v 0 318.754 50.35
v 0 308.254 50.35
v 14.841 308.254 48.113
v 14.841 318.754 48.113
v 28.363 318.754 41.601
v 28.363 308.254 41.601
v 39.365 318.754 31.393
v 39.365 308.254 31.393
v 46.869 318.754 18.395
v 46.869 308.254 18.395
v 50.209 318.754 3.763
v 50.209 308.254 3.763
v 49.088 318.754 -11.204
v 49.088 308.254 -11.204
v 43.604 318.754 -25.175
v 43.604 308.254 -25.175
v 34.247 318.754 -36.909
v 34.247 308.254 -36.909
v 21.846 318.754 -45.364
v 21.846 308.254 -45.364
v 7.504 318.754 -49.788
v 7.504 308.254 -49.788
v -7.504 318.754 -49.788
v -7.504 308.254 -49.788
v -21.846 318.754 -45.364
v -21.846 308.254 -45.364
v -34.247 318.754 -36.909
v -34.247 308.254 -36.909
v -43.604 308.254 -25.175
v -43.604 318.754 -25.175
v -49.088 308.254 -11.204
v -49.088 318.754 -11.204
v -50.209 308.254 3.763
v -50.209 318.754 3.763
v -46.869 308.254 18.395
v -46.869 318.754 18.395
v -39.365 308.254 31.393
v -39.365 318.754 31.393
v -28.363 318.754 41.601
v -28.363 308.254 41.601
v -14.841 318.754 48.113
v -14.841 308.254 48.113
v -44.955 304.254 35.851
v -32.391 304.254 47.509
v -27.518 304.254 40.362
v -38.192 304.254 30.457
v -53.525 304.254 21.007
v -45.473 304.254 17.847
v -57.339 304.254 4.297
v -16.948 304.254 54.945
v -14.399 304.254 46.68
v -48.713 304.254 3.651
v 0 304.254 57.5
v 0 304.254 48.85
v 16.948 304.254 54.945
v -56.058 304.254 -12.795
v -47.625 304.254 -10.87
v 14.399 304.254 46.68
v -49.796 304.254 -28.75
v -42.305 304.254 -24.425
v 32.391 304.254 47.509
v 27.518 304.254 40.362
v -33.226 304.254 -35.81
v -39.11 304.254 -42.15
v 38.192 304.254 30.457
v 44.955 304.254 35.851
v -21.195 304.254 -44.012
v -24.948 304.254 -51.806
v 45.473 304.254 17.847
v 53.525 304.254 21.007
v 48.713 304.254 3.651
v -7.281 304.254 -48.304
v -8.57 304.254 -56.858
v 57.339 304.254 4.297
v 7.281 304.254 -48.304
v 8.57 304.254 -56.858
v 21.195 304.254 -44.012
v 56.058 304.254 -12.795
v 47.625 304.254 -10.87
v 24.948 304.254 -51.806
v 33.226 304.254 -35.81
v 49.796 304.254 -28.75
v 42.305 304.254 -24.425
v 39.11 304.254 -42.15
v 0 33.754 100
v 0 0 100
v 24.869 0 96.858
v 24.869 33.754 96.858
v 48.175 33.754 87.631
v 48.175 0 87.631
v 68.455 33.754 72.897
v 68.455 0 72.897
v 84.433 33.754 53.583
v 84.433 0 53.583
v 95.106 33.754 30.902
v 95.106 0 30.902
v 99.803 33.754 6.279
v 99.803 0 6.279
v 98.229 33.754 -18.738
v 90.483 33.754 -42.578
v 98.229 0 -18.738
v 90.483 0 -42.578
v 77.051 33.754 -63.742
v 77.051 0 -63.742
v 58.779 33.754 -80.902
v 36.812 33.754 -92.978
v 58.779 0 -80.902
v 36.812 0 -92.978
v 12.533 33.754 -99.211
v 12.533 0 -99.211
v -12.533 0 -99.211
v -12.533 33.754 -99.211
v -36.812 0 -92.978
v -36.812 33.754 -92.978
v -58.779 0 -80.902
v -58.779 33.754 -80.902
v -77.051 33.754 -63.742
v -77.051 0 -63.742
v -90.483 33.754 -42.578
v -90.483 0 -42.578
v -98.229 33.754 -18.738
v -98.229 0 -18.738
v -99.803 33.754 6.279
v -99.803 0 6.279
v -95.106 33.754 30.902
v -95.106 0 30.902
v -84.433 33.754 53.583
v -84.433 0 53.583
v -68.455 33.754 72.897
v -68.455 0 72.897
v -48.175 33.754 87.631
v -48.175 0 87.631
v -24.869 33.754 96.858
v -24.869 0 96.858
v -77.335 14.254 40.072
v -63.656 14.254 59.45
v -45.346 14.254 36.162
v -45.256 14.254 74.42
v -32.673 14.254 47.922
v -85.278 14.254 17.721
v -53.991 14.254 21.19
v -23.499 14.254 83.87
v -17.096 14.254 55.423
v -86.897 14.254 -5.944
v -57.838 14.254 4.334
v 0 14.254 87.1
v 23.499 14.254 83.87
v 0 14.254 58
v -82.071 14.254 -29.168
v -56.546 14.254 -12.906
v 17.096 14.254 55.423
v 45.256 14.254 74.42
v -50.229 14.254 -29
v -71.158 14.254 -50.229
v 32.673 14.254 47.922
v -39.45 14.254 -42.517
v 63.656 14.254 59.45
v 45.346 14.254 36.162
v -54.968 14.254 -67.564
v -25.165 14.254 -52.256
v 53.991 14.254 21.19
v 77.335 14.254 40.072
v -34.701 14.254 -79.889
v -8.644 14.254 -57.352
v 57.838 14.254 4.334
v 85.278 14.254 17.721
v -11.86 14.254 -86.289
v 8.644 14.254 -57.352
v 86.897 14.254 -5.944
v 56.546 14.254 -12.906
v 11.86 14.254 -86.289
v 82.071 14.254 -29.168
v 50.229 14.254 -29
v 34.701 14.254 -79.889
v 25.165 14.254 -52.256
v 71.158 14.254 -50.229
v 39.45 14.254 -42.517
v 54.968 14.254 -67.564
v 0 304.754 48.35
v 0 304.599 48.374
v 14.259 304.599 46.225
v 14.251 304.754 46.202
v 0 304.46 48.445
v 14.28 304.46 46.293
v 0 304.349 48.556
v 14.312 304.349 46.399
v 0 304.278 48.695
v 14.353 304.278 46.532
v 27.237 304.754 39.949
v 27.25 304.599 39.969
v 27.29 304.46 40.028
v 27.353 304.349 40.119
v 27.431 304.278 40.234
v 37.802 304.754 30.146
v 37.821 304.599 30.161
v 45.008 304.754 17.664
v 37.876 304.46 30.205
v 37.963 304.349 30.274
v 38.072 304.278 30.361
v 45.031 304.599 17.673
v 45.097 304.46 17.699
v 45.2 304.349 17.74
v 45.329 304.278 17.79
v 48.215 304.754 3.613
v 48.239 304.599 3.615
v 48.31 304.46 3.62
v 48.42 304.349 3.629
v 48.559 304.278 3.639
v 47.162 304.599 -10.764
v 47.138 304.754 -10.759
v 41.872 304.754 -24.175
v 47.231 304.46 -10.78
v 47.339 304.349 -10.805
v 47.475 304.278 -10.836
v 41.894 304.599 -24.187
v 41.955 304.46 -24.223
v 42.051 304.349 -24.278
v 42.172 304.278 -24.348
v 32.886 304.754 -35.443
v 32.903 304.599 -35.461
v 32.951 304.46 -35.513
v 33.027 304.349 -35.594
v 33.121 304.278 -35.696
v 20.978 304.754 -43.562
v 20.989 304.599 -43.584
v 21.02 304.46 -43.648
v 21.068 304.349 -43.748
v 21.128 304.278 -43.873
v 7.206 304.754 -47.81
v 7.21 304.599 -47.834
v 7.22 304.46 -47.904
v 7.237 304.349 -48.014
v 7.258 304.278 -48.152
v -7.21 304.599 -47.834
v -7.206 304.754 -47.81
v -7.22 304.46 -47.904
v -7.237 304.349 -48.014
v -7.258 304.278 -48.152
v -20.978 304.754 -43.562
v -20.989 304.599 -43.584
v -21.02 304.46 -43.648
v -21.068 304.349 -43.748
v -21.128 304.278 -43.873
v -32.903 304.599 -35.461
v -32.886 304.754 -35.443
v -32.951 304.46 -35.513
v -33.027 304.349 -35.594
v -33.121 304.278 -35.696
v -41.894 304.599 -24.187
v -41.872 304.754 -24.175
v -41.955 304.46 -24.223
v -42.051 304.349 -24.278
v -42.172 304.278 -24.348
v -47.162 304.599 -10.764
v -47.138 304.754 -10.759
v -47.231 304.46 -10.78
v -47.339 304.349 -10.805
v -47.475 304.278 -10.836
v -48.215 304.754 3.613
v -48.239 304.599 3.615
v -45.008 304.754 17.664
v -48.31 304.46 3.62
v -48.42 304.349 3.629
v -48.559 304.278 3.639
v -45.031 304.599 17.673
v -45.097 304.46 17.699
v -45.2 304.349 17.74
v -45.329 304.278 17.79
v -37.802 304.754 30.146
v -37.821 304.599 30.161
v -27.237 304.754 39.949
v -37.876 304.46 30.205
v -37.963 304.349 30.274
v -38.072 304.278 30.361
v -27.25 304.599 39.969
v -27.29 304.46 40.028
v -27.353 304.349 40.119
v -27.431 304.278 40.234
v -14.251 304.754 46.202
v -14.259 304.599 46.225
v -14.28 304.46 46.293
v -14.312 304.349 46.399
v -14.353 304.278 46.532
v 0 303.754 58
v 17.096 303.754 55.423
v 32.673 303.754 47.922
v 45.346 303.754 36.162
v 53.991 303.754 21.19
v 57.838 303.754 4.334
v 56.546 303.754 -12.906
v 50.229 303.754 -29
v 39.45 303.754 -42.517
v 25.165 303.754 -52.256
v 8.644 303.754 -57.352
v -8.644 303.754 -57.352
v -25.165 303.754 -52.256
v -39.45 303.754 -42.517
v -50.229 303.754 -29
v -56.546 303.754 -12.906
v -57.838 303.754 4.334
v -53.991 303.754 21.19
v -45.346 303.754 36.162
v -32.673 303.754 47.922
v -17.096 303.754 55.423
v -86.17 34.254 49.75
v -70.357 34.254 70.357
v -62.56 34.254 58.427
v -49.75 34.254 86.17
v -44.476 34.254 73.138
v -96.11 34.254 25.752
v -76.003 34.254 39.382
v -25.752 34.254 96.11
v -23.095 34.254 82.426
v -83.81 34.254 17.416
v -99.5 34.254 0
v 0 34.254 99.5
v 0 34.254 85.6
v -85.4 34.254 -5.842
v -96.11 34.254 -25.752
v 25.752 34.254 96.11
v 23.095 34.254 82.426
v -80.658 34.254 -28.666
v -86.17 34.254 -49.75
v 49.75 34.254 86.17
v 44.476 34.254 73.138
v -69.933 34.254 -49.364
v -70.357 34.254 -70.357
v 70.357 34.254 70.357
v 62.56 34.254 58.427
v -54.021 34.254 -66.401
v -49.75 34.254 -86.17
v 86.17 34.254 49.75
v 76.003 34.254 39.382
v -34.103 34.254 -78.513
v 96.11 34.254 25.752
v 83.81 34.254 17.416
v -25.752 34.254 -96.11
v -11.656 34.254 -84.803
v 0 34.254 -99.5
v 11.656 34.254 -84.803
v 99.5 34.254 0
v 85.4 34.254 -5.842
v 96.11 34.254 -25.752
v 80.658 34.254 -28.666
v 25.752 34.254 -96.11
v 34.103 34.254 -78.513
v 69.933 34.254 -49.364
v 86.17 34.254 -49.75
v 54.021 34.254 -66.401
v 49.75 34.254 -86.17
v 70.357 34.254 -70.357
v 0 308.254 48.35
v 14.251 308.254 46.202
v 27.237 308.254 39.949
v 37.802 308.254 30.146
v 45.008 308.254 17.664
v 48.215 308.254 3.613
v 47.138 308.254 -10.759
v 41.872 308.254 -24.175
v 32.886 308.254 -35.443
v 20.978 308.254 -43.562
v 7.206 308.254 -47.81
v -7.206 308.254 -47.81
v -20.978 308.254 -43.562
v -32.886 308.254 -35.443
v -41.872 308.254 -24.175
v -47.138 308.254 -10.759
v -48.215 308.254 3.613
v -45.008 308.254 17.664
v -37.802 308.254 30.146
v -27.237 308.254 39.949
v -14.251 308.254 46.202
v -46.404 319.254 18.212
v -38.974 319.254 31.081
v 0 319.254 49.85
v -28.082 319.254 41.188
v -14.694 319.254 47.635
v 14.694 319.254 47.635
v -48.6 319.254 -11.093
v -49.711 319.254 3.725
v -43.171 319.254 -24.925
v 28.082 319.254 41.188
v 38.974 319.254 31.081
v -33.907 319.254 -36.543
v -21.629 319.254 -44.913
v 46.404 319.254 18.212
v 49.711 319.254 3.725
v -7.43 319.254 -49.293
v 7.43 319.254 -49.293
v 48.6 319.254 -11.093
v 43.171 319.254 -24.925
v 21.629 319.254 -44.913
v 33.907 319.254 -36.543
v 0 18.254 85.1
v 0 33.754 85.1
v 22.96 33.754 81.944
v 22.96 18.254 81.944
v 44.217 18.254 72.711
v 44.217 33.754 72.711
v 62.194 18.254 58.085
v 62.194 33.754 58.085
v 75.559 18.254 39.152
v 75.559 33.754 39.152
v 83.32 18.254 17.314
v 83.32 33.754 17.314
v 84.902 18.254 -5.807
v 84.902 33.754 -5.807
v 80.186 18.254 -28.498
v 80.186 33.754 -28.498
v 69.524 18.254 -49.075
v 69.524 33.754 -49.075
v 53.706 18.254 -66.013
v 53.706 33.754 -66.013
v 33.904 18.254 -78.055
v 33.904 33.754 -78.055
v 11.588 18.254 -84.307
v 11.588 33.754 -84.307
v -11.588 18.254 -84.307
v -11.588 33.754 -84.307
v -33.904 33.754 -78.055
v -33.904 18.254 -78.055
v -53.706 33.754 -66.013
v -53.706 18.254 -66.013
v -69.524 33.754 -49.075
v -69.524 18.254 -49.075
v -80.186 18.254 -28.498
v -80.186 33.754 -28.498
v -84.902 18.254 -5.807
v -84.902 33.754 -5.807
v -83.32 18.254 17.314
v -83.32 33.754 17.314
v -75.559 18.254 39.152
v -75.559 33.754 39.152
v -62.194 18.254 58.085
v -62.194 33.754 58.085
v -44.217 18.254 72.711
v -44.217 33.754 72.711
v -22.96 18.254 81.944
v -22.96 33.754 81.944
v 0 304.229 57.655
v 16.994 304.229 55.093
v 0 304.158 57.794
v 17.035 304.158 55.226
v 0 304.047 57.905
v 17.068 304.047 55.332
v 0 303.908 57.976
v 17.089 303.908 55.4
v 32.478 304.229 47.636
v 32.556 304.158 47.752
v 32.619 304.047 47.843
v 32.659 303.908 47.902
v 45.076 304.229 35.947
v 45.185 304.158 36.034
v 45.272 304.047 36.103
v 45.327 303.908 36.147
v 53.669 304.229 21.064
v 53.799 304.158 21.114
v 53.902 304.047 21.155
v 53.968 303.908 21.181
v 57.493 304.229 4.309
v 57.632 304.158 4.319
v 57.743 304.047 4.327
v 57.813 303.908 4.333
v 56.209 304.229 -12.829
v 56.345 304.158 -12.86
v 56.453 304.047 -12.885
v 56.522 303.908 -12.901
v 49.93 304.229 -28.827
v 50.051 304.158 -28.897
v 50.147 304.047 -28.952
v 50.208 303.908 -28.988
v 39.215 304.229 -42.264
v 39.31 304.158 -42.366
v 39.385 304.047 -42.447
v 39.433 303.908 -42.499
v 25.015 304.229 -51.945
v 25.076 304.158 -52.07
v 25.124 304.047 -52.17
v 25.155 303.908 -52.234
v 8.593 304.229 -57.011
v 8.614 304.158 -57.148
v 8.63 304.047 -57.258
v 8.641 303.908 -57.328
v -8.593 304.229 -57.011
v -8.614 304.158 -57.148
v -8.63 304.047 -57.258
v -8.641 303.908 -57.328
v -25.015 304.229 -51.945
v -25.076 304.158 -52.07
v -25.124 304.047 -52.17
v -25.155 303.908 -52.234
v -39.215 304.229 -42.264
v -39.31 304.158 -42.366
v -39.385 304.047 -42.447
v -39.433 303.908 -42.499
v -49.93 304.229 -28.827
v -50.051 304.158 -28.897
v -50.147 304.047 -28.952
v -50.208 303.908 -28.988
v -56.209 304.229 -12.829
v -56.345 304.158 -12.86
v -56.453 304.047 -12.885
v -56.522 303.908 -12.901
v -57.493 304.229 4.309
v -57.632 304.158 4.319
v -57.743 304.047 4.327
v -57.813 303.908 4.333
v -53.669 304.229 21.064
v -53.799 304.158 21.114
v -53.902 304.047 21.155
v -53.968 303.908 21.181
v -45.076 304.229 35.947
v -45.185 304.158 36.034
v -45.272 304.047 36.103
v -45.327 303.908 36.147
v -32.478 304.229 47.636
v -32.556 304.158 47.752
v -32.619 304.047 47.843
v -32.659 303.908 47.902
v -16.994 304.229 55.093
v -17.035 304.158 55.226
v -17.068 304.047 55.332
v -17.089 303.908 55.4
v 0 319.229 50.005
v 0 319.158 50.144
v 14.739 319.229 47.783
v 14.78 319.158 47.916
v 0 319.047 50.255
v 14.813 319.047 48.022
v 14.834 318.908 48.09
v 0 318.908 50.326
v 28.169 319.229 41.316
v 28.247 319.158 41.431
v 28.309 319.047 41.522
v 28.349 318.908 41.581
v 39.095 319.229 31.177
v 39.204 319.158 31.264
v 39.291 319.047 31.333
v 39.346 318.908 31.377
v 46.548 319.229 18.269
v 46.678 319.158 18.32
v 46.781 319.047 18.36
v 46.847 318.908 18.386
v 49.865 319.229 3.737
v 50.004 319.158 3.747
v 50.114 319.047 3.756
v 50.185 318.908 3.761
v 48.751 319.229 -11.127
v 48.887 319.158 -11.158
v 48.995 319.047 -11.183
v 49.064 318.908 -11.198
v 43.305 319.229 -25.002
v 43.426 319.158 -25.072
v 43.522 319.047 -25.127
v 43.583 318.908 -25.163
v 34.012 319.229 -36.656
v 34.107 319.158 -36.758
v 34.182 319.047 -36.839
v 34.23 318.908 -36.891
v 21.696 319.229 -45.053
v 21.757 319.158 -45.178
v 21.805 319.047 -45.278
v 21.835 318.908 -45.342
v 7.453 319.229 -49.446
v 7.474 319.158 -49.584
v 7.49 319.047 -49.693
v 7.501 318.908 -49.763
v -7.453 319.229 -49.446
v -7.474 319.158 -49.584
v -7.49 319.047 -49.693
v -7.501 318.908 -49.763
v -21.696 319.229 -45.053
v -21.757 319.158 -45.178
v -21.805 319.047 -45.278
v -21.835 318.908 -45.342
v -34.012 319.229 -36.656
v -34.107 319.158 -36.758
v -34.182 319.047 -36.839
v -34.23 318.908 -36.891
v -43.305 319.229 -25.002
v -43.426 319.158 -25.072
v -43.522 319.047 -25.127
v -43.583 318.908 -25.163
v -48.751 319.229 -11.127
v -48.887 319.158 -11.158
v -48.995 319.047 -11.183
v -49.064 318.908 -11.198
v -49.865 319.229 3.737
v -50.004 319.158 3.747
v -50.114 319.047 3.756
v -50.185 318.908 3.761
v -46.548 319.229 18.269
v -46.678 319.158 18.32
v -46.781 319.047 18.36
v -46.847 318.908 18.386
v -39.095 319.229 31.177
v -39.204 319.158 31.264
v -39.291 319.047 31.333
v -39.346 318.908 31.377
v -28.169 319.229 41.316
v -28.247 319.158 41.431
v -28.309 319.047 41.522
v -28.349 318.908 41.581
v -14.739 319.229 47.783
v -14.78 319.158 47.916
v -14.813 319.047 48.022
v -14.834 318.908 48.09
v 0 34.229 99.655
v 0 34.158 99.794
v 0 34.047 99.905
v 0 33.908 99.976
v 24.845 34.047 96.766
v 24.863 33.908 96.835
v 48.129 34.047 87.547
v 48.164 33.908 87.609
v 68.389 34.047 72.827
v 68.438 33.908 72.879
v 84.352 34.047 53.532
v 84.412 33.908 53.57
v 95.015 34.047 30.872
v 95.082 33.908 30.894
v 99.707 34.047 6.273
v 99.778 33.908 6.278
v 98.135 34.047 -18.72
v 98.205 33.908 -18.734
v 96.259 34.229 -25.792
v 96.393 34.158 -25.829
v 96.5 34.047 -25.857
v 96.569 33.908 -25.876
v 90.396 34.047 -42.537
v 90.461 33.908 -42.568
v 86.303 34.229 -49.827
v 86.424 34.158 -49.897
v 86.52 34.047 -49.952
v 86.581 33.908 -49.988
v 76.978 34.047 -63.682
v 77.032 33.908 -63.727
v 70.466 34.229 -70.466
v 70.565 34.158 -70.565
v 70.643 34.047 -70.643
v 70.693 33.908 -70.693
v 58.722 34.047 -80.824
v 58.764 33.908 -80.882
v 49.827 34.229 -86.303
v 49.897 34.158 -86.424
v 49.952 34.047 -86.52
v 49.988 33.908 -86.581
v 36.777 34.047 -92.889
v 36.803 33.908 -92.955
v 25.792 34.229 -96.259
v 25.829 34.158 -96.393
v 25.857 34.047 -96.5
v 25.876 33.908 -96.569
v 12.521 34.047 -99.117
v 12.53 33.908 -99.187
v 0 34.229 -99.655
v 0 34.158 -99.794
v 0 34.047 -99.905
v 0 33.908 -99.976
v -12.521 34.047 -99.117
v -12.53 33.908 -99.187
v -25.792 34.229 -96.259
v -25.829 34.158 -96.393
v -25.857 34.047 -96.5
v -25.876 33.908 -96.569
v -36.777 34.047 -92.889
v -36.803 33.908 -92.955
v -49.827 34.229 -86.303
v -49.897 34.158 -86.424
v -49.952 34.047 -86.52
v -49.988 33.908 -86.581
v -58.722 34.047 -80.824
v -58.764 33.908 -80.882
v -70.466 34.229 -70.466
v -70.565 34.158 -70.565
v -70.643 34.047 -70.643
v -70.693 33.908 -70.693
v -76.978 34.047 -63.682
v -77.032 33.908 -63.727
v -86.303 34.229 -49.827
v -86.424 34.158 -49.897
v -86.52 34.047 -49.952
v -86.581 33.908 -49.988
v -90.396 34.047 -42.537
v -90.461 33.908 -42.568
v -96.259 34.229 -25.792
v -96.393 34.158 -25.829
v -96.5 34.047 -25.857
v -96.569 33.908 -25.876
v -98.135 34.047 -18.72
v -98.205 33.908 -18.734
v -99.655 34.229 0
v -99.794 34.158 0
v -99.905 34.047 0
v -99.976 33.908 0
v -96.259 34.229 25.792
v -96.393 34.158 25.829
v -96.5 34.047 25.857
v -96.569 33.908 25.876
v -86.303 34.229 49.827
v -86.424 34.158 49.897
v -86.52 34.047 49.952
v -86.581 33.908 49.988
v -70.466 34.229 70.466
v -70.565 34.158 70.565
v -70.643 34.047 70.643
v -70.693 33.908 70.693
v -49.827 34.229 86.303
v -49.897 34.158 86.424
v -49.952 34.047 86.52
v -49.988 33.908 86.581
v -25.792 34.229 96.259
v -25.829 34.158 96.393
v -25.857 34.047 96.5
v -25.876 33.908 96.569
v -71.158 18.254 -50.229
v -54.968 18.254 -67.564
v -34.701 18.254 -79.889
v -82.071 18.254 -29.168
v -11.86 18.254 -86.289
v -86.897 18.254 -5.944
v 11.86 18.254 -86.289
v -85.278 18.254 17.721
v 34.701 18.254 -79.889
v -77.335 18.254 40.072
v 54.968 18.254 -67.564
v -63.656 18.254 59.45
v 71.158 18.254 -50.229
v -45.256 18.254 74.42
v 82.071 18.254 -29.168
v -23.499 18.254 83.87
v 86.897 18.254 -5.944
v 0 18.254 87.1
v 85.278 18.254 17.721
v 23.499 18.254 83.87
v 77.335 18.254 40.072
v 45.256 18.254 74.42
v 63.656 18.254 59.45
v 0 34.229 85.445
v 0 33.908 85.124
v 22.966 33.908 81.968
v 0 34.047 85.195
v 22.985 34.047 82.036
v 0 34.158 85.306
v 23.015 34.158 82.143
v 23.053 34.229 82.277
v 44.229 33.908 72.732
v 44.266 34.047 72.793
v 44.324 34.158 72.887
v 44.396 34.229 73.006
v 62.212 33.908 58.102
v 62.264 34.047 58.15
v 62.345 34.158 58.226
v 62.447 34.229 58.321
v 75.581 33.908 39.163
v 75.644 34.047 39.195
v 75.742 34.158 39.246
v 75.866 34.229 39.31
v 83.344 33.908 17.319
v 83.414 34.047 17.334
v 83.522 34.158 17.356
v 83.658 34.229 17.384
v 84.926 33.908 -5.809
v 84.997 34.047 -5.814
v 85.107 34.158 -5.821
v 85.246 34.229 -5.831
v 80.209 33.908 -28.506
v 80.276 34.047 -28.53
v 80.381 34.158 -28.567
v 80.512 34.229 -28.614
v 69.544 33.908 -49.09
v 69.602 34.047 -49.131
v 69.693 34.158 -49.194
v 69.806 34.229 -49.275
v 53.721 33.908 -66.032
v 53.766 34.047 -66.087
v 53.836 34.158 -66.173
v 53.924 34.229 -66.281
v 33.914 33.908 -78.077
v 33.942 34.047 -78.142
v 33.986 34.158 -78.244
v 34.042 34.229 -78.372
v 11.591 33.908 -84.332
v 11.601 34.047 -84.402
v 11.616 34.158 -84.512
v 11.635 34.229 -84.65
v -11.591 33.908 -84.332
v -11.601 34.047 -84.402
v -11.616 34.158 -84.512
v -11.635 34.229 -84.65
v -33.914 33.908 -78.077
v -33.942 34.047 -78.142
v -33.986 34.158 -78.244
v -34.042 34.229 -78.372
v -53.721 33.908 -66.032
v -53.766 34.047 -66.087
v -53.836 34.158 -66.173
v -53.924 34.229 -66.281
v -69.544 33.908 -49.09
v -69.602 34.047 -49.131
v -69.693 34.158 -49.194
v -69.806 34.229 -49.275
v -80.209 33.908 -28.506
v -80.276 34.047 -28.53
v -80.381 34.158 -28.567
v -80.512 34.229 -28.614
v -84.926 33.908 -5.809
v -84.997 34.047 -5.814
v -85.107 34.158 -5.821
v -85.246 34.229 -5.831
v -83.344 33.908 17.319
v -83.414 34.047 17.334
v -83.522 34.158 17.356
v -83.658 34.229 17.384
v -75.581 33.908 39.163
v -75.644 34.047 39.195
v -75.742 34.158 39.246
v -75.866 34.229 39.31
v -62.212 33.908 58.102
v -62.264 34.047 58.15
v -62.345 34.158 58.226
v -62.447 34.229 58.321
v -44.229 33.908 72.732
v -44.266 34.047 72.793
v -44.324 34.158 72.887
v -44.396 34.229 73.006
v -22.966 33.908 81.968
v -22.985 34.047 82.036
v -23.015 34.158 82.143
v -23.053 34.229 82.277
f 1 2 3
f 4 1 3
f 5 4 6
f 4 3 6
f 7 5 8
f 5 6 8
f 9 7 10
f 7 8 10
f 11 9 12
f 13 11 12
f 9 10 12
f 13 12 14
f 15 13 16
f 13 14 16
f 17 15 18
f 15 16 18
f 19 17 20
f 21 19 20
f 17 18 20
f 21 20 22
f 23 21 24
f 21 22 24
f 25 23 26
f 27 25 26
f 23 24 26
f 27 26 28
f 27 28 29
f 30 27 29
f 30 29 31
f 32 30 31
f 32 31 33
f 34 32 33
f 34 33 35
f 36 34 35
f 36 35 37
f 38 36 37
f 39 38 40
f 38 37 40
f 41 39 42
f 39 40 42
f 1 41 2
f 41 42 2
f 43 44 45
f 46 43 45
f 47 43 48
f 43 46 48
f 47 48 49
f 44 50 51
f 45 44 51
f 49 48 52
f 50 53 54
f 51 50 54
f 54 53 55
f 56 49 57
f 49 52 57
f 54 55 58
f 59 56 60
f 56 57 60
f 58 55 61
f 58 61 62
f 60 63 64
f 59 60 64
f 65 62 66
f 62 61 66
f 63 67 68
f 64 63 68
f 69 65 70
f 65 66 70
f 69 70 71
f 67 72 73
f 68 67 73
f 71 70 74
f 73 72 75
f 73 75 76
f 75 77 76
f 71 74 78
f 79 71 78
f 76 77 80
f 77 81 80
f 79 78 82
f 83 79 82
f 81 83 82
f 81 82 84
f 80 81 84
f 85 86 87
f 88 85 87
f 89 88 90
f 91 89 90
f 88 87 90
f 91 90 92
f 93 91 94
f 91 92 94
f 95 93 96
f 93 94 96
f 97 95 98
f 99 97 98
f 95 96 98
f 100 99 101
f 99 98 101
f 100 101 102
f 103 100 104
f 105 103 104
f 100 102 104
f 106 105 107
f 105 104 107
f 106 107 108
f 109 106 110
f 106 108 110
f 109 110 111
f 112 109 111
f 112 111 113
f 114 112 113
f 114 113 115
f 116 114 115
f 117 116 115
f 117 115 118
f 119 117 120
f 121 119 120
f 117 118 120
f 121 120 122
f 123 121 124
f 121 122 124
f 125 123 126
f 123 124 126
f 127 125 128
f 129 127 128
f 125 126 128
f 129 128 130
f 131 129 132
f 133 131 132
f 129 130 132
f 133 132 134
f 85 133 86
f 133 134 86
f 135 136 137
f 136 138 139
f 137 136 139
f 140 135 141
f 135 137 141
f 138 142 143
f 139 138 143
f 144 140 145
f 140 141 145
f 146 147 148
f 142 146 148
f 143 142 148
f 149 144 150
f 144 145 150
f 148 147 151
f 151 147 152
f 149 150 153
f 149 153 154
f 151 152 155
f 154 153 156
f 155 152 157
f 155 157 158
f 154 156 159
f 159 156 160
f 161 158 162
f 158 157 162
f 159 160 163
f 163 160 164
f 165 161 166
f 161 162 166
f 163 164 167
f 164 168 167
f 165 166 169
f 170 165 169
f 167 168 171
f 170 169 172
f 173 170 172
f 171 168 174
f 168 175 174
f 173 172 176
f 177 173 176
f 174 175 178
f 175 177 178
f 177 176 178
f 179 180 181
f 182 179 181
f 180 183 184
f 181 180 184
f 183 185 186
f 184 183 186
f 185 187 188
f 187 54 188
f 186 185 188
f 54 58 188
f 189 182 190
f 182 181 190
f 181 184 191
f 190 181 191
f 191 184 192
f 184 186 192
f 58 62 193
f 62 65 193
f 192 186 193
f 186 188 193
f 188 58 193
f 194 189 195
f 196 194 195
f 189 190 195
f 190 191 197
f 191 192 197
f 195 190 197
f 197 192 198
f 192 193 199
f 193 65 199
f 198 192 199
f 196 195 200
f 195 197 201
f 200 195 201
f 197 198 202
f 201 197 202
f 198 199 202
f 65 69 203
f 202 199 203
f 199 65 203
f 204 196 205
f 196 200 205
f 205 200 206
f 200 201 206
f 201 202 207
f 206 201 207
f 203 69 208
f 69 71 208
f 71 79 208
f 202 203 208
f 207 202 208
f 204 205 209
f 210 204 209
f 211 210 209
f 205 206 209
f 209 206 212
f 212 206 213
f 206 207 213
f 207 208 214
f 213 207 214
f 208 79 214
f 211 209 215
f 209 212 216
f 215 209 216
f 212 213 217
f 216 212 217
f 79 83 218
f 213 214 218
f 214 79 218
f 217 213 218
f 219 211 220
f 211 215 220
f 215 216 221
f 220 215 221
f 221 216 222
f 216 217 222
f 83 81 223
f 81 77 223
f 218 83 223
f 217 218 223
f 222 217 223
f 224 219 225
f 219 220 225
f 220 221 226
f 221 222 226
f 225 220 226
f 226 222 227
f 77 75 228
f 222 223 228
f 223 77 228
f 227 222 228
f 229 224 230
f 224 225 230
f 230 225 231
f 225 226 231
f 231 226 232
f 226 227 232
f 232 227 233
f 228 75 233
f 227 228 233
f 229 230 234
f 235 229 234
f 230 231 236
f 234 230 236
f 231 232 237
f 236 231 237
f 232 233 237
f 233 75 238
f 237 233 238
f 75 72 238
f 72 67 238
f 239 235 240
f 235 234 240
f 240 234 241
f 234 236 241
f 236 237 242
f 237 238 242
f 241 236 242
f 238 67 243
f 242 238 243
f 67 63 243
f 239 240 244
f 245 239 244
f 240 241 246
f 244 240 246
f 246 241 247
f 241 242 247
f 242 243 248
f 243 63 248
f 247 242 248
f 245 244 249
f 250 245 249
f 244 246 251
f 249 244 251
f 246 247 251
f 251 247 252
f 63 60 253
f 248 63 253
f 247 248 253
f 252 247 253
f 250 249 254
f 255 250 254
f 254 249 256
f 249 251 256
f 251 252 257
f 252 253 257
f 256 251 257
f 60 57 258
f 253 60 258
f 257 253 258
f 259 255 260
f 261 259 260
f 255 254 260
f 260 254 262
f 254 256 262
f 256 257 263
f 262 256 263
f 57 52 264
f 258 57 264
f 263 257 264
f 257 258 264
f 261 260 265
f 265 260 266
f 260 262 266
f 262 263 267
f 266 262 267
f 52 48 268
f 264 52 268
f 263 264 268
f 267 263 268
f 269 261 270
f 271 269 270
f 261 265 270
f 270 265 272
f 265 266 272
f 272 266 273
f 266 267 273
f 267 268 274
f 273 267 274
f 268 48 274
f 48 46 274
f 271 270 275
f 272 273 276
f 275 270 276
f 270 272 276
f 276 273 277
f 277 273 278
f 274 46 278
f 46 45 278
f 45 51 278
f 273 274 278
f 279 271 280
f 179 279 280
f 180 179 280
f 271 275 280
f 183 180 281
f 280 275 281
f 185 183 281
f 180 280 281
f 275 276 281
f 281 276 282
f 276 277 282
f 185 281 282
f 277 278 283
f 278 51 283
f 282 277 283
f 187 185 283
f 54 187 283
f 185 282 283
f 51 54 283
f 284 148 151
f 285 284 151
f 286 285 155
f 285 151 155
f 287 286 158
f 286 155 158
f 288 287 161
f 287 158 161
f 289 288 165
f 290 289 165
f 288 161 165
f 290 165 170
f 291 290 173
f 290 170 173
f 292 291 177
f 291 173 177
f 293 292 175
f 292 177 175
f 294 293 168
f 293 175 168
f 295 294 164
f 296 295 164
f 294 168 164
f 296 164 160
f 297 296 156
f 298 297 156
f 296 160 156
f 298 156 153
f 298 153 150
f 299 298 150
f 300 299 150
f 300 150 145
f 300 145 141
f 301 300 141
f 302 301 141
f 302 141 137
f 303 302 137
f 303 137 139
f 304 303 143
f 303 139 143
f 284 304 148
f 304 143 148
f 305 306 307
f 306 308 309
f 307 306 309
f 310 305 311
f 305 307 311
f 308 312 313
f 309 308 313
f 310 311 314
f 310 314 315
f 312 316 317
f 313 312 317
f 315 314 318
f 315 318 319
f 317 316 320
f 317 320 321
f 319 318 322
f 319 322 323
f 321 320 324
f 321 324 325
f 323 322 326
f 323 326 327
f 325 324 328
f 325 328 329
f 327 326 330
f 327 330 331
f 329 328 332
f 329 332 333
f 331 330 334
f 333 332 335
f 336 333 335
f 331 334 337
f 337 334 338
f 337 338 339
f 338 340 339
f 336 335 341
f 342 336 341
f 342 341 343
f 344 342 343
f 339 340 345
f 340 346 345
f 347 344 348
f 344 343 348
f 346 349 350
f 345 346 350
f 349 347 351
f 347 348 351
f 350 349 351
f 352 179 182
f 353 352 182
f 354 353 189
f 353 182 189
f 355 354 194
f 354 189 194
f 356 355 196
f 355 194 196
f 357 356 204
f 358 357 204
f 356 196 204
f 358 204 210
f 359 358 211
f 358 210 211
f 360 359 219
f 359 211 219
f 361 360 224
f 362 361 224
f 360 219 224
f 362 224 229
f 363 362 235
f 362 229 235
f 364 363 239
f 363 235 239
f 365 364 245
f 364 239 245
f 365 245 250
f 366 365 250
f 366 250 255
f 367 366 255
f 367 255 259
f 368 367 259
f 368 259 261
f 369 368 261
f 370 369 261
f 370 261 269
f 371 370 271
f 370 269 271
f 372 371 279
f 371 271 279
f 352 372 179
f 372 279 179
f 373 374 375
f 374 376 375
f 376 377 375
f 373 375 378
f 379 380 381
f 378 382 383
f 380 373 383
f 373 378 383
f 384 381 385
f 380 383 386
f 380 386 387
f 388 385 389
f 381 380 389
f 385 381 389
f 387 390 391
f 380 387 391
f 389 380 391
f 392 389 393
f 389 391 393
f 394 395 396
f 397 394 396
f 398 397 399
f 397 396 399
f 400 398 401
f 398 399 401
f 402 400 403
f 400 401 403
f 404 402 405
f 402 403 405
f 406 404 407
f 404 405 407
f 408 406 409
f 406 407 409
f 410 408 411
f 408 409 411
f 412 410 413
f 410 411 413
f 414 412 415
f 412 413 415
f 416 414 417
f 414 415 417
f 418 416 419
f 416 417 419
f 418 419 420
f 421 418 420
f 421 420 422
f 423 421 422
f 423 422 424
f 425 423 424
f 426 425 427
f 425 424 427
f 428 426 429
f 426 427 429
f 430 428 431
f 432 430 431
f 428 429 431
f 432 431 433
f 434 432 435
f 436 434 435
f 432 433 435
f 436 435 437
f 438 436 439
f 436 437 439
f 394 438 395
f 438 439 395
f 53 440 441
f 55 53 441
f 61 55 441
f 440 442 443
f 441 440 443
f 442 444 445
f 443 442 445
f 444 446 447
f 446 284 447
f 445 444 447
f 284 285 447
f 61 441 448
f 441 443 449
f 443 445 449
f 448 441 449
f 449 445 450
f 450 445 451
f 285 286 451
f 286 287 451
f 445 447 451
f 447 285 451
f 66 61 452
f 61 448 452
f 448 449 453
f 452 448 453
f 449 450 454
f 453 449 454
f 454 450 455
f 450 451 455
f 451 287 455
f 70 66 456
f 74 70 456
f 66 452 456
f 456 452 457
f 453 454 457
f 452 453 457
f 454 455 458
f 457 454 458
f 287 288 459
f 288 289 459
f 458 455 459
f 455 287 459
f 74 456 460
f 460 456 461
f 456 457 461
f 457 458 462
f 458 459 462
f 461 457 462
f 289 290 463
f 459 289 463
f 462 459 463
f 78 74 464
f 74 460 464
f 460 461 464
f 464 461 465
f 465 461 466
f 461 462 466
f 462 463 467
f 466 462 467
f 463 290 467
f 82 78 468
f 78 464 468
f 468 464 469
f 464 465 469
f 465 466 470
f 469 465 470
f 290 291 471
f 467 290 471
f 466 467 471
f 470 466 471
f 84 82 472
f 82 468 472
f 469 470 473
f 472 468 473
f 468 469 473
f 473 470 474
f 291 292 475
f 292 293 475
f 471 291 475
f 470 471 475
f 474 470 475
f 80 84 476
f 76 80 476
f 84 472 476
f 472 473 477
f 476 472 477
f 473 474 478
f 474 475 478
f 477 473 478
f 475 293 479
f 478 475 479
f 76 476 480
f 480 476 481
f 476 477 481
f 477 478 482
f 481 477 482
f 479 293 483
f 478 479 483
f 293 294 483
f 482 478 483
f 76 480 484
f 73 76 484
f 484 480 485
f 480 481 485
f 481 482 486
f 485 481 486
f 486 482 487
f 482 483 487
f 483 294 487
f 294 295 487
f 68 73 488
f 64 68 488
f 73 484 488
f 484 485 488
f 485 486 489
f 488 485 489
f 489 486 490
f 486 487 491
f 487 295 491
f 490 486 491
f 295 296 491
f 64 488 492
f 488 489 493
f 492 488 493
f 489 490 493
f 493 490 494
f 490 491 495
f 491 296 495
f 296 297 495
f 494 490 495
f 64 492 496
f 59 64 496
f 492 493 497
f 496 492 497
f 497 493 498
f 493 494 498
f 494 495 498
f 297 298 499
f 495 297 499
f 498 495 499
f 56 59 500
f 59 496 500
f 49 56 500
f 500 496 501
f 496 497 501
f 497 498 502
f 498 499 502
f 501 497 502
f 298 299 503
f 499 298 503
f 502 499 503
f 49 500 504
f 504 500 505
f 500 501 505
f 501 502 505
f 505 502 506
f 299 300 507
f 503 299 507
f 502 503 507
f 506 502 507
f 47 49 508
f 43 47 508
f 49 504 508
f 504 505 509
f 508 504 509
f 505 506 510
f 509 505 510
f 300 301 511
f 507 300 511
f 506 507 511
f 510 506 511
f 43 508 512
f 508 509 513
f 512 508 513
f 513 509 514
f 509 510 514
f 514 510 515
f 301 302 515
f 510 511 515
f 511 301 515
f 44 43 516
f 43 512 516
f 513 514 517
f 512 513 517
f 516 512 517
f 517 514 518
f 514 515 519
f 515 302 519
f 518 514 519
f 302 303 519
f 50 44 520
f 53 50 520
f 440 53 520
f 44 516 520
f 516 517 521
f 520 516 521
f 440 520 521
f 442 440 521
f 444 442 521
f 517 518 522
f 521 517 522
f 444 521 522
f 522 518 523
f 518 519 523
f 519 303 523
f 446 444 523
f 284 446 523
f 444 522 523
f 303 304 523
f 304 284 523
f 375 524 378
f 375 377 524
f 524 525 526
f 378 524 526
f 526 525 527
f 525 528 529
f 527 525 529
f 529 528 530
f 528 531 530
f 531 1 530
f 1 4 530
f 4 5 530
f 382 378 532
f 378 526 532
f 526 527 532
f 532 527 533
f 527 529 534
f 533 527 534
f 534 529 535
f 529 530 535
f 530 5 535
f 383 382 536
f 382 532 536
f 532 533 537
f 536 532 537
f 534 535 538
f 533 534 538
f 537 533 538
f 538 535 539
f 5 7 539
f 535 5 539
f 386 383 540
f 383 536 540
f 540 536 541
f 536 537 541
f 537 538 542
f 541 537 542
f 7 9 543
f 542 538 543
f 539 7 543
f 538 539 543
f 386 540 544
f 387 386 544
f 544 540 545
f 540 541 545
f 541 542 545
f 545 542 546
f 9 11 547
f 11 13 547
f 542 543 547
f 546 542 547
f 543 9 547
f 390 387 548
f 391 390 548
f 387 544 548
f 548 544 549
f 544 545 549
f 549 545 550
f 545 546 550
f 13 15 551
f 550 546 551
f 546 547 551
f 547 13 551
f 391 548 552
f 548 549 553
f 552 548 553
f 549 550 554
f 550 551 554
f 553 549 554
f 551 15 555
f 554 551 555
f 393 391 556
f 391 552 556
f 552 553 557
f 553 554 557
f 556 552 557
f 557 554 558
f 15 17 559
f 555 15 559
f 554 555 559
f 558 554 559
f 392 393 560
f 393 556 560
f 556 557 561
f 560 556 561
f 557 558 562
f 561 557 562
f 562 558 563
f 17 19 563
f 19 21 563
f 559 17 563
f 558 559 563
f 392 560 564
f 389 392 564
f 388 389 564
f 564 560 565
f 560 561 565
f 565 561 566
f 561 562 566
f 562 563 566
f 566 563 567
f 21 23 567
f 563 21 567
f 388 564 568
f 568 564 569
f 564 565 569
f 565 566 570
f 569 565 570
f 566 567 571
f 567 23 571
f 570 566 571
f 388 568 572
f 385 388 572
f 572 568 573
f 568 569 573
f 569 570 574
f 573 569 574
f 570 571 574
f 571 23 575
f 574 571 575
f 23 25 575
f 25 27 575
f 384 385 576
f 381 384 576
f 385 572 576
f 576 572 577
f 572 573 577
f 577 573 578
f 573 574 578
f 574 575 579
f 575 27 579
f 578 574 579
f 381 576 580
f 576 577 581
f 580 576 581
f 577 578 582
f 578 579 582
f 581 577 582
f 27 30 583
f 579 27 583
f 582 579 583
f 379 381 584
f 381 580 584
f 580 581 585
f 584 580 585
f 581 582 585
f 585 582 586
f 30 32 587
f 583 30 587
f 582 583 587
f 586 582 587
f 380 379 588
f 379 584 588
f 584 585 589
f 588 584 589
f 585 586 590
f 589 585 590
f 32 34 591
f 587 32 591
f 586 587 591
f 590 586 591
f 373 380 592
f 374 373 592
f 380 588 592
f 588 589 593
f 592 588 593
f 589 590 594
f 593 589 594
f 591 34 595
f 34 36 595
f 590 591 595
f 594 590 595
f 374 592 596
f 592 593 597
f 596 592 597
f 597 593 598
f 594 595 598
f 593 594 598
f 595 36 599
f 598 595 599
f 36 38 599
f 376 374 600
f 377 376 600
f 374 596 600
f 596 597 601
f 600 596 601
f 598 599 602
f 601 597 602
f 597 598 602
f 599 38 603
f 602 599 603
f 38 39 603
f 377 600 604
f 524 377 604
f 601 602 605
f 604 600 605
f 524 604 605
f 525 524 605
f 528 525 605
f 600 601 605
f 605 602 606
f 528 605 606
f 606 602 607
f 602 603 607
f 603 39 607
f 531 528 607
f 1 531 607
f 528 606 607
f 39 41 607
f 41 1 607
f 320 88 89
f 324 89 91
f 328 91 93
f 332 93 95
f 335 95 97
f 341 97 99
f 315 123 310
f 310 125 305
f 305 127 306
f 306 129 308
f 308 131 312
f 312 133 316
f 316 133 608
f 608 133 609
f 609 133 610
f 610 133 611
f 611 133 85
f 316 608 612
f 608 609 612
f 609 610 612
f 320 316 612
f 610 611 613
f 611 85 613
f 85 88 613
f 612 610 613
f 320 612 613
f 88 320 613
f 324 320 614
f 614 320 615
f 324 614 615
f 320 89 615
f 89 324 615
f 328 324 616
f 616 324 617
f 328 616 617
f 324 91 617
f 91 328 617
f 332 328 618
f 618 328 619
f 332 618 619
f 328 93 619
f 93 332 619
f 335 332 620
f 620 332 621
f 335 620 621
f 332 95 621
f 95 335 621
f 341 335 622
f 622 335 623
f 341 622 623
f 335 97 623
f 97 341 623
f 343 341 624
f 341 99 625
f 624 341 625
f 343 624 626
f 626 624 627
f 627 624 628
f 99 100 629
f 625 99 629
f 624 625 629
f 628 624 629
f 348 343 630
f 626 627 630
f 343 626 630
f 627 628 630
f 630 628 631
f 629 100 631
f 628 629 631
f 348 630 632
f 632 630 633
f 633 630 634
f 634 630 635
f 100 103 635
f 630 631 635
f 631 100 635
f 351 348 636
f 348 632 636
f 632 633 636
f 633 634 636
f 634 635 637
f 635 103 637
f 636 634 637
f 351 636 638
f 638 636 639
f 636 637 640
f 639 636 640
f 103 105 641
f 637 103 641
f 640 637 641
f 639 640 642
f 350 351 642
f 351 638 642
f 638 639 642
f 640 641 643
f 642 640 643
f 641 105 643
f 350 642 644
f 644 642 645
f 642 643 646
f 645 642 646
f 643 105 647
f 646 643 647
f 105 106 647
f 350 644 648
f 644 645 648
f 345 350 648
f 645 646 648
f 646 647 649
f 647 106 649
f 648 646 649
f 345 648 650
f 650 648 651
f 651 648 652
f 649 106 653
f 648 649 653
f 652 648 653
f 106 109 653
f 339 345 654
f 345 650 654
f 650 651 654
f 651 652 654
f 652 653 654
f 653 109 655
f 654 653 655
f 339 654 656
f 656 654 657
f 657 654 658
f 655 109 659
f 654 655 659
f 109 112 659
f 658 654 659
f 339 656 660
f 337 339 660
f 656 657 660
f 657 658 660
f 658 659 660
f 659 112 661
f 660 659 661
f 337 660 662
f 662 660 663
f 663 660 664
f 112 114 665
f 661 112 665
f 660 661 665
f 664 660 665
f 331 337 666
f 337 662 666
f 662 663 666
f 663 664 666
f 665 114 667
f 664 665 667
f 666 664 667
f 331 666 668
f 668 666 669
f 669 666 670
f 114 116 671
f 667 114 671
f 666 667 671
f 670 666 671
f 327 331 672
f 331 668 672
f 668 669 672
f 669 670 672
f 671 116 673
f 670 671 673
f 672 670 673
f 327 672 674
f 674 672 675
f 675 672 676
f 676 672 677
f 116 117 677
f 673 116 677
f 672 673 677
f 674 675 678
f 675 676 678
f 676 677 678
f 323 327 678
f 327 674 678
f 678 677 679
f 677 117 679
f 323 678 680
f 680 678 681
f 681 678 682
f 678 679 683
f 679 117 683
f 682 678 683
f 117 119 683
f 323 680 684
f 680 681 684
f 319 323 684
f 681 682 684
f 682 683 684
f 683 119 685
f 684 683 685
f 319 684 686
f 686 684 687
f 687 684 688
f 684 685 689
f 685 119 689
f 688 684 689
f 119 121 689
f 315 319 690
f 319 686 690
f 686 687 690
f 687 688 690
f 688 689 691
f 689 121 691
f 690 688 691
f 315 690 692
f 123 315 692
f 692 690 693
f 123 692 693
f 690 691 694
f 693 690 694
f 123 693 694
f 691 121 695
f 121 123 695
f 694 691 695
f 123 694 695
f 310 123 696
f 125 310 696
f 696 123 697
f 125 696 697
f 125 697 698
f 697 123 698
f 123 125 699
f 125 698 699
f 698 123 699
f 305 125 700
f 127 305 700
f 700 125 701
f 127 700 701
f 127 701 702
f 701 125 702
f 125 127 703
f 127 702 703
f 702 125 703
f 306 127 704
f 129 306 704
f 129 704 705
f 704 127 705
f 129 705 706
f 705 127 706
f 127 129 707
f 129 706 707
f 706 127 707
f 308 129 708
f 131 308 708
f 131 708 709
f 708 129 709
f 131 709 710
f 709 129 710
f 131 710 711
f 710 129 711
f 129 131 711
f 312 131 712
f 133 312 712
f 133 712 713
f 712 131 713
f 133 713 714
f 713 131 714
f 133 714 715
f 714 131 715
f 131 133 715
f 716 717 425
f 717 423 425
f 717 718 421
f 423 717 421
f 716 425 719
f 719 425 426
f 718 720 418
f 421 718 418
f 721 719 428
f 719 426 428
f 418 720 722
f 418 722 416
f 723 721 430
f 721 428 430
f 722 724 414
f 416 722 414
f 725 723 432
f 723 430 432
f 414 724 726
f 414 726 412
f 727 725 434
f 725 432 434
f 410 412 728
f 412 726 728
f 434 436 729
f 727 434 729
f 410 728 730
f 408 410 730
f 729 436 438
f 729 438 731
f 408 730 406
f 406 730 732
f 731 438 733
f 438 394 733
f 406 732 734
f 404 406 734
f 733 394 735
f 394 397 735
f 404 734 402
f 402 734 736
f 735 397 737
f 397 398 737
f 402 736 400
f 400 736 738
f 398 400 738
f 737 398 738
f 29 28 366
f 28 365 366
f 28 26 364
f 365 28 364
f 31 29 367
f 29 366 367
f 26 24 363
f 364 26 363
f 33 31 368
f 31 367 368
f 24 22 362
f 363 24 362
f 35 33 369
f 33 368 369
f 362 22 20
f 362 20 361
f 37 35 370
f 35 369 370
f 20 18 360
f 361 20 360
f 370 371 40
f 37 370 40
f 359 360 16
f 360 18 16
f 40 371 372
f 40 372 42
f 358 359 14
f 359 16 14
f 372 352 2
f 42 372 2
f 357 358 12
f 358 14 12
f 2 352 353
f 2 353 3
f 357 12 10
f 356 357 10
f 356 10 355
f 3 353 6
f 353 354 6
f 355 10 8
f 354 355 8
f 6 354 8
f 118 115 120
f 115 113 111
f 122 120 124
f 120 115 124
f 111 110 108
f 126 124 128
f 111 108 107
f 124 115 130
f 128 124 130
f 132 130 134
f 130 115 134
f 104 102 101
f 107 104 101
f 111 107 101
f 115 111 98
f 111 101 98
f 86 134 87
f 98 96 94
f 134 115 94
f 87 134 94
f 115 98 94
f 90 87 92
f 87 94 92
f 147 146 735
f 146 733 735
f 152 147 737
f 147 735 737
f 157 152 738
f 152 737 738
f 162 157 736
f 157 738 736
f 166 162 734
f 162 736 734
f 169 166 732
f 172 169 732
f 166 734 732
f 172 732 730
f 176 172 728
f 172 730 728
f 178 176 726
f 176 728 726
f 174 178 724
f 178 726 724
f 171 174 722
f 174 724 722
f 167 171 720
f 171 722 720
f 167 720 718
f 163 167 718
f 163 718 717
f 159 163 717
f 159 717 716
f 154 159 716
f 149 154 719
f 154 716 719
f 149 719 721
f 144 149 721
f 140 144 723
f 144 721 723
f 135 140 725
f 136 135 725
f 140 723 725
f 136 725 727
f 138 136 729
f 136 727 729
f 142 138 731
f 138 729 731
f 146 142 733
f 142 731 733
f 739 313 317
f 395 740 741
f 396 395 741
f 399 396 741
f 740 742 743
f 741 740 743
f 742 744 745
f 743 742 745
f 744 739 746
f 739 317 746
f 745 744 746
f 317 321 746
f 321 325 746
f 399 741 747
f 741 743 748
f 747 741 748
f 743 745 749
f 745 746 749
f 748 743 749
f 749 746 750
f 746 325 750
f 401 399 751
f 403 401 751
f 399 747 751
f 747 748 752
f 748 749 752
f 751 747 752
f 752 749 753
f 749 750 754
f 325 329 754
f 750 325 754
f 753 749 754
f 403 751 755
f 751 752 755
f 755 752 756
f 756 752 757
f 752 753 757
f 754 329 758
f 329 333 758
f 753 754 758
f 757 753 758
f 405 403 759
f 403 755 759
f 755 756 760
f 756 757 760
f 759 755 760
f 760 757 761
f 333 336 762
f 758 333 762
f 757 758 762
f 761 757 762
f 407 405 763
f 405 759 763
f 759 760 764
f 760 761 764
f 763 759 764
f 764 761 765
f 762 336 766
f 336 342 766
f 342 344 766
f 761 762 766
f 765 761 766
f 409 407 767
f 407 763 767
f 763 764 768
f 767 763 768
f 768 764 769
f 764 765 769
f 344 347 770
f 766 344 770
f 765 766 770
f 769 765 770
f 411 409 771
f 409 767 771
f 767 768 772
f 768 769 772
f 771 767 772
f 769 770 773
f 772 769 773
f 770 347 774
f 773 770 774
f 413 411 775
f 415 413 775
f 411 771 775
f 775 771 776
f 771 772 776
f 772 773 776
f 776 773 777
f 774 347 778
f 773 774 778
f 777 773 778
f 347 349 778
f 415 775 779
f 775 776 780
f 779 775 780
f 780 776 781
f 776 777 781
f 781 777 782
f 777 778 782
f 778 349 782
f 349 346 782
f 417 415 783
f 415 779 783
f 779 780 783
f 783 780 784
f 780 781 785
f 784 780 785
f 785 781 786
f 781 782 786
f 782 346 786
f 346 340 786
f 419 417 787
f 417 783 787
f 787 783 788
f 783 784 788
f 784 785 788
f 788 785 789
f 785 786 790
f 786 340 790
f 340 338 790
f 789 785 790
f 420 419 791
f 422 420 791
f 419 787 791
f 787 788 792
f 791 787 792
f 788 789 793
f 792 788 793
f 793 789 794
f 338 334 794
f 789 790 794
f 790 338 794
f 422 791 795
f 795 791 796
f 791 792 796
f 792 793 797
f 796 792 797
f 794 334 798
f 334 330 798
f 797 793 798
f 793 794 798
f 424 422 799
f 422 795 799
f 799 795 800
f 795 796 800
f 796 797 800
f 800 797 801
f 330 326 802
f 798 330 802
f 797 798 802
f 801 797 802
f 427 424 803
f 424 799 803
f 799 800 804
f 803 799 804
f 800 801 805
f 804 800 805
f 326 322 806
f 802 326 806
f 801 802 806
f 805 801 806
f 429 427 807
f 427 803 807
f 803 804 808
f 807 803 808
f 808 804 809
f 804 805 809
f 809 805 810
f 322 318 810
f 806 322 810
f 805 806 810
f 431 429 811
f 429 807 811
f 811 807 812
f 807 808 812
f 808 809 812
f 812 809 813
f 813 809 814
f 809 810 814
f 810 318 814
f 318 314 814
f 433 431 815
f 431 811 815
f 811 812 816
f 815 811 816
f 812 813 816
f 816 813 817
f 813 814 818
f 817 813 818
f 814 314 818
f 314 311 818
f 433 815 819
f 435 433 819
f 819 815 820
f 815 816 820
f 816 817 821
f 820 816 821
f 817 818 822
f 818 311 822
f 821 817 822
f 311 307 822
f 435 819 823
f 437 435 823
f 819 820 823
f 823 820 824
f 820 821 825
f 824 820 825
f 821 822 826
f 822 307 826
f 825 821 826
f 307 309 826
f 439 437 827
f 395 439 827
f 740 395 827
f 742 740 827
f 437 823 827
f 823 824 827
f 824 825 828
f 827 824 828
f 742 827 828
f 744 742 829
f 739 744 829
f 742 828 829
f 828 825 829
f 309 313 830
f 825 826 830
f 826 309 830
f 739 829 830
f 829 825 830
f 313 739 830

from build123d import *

# Parameters (mm, degrees)
F2_R = 0.5


with BuildPart() as f1:
    # F0 (on Right) → F1 (revolve)
    with BuildSketch(Plane.YZ):
        Polygon((0, 100), (0, 0), (319.253526, 0), (319.253526, 50.35), (308.253526, 50.35), (308.253526, 48.35), (304.253526, 48.35), (304.253526, 58), (14.253526, 58), (14.253526, 87.1), (18.253526, 87.1), (18.253526, 85.1), (34.253526, 85.1), (34.253526, 100), align=None)
    revolve(axis=Axis((0, 159.626763, 0), (0, 1, 0)))

    # F2
    f2_edges = [f1.edges().sort_by_distance(p)[0] for p in [
        (0, 319.253526, -50.35),
        (0, 304.253526, -48.35),
        (0, 304.253526, -58),
        (0, 34.253526, -85.1),
        (0, 34.253526, -100),
    ]]
    fillet(f2_edges, radius=F2_R)


solid = f1.part
